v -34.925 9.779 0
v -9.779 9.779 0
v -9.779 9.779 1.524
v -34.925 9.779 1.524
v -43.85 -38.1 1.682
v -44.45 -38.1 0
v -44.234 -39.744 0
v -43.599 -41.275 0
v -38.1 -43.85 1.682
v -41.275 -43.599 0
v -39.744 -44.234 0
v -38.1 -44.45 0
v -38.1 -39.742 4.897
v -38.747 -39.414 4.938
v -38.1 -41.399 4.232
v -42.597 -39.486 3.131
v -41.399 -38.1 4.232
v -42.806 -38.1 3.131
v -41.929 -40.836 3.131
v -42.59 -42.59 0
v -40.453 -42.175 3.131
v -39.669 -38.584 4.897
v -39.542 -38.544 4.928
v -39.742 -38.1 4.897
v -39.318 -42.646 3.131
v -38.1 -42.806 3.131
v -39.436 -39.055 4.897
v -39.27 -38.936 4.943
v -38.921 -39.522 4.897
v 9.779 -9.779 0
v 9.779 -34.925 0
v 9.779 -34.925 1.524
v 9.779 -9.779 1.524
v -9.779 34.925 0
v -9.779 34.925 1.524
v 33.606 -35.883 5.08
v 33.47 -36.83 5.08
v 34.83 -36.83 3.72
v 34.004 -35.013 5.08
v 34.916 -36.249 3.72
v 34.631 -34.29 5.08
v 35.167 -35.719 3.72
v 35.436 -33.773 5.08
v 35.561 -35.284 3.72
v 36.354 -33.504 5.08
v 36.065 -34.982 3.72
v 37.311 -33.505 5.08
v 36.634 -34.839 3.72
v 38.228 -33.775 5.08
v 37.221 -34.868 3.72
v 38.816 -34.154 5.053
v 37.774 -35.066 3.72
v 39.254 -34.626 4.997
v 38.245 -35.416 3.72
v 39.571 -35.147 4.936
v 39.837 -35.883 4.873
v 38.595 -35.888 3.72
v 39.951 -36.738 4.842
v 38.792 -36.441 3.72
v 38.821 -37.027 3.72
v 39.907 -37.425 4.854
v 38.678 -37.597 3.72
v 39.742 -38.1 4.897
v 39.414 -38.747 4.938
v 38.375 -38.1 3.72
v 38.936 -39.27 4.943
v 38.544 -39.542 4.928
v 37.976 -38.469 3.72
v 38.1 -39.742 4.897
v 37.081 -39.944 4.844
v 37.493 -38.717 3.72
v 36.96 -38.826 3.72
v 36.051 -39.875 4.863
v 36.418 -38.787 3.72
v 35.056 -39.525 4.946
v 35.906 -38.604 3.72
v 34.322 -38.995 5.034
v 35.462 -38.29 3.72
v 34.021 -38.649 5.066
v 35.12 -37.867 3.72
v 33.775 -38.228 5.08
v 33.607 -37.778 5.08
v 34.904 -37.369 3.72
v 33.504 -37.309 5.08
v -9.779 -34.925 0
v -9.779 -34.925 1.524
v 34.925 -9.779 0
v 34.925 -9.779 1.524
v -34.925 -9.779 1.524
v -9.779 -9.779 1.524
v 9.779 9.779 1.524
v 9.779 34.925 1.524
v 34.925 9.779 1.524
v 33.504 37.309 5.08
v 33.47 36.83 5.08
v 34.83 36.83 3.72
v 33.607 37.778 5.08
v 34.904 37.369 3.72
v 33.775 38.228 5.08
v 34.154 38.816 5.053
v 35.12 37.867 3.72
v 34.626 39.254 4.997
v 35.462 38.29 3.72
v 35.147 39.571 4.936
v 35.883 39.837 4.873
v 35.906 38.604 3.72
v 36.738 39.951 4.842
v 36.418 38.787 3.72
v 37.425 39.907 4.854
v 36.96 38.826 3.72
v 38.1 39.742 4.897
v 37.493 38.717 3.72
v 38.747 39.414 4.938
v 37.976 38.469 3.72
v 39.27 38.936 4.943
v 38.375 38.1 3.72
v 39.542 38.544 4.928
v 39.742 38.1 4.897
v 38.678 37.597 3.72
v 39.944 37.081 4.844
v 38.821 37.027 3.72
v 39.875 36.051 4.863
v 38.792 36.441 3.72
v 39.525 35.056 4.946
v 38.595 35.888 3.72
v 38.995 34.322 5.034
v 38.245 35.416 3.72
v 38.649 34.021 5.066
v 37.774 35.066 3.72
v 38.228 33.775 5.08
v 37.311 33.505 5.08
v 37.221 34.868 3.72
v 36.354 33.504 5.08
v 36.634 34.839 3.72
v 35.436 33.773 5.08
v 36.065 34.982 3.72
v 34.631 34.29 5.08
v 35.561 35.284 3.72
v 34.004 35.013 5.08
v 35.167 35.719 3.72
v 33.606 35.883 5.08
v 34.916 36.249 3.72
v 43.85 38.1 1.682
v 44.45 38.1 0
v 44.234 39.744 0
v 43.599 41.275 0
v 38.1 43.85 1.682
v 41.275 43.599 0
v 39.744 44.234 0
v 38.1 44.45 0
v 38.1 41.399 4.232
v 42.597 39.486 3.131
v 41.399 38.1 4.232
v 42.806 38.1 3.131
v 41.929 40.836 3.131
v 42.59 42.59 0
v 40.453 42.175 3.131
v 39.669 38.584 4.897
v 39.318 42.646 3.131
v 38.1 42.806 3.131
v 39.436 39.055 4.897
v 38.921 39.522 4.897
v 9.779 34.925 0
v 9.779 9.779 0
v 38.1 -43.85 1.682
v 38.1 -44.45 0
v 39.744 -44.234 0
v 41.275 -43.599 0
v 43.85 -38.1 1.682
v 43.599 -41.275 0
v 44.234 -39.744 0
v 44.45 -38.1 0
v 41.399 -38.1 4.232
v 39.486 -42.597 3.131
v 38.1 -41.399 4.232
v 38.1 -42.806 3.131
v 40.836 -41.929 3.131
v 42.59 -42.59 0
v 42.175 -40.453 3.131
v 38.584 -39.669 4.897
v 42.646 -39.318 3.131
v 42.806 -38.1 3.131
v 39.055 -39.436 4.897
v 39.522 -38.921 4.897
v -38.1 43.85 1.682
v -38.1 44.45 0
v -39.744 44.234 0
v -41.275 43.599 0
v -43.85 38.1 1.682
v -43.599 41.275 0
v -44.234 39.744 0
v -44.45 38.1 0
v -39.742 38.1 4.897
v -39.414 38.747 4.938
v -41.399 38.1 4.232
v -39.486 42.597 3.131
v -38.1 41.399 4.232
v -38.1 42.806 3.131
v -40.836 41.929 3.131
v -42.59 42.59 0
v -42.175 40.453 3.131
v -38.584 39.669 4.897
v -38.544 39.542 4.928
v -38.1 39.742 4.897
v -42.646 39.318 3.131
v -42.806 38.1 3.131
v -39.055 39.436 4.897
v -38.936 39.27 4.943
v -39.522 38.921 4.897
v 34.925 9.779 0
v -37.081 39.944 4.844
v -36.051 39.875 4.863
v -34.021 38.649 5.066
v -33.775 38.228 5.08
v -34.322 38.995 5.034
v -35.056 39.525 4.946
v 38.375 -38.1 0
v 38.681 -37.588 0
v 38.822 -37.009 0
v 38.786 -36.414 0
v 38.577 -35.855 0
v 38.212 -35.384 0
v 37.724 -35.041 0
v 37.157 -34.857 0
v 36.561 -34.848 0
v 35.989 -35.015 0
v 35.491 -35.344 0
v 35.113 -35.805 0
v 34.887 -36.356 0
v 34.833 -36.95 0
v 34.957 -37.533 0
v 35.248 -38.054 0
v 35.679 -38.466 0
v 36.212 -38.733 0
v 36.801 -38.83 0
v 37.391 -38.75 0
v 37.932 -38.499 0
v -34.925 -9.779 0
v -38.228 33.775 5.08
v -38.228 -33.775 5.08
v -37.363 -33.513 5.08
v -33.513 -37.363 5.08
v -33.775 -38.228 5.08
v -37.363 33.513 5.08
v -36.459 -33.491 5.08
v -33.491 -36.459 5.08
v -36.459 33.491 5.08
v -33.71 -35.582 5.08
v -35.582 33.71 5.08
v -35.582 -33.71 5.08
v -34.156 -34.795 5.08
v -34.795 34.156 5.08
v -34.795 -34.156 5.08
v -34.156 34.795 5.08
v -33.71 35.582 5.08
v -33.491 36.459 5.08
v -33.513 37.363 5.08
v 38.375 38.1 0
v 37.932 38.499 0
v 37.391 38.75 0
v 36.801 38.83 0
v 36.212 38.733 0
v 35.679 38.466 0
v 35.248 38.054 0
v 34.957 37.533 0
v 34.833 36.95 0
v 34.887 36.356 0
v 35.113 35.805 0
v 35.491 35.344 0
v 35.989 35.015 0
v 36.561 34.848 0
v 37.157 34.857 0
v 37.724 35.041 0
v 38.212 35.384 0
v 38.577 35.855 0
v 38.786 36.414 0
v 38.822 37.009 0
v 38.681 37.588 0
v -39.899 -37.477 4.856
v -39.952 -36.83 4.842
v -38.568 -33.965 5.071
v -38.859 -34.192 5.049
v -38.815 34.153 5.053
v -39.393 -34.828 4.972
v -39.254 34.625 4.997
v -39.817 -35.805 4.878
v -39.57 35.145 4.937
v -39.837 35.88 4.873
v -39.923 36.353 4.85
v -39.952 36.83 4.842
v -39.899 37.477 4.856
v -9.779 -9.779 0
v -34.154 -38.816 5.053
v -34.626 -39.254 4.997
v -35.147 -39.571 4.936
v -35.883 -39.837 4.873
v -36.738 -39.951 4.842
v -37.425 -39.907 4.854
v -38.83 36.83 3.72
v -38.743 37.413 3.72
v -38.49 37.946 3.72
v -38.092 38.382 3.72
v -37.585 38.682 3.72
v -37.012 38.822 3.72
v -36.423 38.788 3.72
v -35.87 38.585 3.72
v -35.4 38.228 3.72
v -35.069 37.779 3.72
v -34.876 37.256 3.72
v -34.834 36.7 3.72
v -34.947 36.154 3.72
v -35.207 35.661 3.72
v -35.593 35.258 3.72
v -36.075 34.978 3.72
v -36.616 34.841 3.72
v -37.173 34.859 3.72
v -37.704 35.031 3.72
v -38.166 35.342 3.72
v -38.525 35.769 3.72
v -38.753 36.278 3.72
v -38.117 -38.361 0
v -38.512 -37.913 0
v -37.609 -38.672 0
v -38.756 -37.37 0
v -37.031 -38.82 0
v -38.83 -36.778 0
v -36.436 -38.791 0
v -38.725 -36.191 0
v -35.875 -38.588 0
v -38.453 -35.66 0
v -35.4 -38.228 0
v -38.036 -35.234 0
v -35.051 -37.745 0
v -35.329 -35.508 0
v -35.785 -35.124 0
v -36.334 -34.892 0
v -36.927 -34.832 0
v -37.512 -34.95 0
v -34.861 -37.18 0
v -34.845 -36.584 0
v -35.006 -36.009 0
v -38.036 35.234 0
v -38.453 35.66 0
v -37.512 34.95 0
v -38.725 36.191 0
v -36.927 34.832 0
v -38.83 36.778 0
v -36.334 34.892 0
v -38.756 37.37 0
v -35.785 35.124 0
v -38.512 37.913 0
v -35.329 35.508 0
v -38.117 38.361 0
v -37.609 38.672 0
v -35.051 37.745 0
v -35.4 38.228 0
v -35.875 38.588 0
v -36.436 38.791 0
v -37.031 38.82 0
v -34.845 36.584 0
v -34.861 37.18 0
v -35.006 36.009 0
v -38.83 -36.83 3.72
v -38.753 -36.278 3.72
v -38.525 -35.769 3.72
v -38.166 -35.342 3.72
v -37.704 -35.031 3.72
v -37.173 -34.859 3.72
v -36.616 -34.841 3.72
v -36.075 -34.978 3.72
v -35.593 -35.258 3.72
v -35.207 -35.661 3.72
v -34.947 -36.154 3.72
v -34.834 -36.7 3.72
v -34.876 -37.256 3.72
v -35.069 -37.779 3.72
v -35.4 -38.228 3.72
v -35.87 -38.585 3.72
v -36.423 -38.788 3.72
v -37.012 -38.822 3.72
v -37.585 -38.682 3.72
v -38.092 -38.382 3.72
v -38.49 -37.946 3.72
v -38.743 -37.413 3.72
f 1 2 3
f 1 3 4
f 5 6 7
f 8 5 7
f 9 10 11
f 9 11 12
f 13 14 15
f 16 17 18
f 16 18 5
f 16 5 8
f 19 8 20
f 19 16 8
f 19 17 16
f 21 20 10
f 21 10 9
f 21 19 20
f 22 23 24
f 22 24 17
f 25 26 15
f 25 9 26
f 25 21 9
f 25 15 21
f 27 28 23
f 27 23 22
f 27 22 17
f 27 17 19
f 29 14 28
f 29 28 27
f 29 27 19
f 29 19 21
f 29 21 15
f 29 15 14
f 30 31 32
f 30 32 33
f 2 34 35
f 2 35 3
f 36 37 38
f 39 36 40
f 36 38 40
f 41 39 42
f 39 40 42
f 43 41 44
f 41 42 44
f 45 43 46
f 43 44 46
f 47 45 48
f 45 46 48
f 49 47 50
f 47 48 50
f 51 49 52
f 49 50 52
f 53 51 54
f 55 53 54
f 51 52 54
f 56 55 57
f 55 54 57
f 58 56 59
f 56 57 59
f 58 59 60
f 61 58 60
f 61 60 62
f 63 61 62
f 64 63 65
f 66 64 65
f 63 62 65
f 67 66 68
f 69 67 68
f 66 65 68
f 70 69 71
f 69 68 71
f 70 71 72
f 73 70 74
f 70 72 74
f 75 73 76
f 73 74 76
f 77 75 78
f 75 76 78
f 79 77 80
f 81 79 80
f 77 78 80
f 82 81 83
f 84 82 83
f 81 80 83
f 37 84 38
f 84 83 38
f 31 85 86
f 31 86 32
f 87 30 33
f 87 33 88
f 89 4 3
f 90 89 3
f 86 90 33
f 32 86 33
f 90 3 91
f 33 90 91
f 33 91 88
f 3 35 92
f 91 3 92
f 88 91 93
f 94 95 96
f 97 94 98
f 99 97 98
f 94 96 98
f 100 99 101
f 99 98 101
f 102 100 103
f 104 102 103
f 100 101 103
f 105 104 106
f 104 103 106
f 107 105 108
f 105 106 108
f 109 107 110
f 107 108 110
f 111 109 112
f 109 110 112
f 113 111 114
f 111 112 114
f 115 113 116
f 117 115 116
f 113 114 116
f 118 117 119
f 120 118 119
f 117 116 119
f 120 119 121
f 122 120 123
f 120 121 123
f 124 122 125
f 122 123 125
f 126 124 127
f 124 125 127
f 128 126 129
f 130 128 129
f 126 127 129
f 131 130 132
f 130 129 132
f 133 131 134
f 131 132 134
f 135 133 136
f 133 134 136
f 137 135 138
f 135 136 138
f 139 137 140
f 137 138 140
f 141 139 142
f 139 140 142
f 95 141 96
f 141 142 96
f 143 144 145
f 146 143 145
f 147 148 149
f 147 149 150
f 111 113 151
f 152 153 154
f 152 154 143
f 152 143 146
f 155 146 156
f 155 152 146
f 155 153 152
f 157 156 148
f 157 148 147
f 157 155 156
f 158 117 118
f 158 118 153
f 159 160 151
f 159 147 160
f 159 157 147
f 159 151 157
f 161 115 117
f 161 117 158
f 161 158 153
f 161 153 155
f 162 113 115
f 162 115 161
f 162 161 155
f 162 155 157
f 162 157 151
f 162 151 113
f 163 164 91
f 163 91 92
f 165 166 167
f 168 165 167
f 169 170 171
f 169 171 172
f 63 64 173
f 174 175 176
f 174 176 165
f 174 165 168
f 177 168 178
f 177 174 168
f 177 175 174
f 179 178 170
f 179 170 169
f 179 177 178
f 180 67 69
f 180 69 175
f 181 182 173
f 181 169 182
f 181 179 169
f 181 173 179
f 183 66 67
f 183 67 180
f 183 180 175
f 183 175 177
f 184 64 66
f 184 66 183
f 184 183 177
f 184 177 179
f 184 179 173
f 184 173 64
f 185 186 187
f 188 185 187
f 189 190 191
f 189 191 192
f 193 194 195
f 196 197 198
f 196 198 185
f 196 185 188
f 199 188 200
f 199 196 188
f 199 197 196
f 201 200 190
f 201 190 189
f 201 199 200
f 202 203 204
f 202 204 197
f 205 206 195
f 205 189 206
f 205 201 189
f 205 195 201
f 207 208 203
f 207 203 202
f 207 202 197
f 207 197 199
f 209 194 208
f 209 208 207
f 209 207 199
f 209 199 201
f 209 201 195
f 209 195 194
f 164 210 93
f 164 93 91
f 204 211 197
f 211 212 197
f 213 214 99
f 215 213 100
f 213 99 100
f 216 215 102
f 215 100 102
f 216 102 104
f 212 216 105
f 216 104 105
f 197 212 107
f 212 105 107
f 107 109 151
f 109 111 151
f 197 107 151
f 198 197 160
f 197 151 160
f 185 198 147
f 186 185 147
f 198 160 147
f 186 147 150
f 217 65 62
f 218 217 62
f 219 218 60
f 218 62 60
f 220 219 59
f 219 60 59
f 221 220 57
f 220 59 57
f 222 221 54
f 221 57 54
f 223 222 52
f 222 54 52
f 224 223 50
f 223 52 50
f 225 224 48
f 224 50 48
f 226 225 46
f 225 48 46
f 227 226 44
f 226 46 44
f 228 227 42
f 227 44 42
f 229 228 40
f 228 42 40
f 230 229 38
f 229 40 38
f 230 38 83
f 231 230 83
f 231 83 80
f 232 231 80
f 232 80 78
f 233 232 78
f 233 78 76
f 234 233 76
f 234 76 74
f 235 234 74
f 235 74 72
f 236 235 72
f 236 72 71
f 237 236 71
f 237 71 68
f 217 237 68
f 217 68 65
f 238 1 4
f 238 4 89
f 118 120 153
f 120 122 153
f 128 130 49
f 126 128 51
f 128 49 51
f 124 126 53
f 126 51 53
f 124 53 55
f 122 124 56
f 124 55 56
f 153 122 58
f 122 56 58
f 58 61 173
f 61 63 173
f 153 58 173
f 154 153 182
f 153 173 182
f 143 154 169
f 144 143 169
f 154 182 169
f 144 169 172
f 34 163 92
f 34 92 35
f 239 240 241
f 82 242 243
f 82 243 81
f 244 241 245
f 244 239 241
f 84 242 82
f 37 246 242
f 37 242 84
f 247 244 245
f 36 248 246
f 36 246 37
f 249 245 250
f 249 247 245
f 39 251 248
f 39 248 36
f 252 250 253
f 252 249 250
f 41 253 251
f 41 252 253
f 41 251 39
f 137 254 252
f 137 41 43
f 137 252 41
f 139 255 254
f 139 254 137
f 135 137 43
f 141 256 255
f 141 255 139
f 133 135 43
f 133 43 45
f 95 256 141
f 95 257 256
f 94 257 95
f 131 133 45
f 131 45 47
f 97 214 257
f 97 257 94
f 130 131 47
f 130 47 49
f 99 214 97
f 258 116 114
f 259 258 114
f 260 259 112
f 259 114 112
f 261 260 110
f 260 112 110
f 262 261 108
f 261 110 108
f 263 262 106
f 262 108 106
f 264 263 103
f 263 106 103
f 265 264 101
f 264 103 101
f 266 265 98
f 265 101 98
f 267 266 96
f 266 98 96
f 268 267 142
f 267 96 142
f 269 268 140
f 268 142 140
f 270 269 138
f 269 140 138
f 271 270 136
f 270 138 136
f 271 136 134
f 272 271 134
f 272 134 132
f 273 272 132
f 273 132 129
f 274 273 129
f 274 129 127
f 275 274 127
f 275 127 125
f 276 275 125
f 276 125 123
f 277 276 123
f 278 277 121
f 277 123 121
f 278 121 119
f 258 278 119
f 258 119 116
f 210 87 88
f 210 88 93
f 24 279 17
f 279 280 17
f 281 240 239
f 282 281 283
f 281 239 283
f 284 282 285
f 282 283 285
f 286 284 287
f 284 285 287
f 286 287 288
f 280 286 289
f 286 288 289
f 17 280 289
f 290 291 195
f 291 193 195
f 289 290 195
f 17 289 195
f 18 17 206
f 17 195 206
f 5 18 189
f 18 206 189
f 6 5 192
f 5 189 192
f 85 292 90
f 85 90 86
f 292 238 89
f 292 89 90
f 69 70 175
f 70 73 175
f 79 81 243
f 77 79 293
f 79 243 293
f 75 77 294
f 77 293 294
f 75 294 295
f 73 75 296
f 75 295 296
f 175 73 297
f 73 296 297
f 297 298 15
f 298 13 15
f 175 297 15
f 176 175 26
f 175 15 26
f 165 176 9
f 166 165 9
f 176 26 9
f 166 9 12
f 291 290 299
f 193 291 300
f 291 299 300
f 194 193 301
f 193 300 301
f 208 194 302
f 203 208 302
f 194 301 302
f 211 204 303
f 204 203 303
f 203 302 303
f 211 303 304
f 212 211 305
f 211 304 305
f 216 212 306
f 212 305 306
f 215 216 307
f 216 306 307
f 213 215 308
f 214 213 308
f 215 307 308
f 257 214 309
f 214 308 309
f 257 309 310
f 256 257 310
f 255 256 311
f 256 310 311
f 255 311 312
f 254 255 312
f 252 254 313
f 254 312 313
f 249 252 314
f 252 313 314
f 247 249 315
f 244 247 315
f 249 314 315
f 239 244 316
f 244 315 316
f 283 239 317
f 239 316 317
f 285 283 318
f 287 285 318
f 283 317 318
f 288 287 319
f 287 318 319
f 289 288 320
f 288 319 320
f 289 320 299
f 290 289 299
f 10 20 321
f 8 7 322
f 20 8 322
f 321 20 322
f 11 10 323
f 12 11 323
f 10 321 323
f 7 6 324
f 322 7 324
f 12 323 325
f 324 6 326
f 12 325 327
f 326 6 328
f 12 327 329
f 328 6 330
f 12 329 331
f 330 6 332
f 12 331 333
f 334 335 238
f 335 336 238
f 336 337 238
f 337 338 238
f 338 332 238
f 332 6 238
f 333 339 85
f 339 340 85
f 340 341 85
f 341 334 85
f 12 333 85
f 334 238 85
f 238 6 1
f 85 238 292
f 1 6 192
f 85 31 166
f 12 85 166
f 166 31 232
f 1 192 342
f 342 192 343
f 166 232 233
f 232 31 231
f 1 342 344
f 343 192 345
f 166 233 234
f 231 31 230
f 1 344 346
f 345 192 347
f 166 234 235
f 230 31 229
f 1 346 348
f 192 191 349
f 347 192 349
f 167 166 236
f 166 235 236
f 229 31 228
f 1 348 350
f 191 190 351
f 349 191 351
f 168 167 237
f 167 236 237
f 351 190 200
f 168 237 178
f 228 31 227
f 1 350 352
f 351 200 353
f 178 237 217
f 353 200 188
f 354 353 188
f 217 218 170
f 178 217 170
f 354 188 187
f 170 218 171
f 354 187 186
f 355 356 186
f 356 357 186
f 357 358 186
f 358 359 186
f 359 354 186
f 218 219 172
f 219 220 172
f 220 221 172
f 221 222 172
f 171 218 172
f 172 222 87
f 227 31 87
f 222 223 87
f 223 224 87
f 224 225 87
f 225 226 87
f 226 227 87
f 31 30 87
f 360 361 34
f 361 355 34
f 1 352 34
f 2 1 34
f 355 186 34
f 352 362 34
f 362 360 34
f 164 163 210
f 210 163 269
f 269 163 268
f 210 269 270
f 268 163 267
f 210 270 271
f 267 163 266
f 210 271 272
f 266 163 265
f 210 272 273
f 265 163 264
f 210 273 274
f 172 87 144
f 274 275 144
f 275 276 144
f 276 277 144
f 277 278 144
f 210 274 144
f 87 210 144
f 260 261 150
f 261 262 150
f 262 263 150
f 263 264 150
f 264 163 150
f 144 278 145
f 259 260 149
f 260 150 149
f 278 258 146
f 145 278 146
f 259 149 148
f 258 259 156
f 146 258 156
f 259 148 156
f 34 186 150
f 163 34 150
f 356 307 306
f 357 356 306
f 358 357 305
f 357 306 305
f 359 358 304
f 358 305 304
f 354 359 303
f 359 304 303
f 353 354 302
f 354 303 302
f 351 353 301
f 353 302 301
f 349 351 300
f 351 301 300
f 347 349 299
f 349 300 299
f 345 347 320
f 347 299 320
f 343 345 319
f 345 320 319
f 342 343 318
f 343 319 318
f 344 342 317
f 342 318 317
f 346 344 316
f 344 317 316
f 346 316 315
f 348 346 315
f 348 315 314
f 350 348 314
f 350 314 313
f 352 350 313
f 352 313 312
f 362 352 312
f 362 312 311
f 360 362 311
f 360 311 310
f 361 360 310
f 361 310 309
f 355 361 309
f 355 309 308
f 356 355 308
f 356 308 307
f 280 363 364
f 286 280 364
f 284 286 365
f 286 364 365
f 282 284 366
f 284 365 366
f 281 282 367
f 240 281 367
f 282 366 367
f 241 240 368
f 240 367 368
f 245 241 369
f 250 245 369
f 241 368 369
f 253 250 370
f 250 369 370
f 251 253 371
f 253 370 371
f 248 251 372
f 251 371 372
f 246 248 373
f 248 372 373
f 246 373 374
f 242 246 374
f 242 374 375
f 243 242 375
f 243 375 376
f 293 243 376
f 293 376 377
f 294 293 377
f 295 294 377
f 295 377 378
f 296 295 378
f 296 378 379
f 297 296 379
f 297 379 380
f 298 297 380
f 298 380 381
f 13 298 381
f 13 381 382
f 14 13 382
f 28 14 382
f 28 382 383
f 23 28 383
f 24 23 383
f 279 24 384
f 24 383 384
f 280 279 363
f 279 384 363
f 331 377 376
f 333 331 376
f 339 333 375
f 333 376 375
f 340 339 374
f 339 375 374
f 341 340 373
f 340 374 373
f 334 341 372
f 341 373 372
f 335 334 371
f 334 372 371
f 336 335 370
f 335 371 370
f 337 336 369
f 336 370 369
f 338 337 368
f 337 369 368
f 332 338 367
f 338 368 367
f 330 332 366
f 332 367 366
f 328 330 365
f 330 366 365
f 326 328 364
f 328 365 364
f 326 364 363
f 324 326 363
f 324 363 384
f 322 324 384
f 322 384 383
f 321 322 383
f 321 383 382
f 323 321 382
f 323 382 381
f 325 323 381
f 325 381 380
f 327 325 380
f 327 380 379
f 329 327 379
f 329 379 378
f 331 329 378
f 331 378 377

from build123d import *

# Parameters (mm, degrees)
BOSS_EXTRUDE1_DEPTH                                  = 5.08
FILLET1_R                                            = 6.35
SKETCH2_R                                            = 2.00025
CUT_EXTRUDE1_DEPTH                                   = 5.08
CUT_EXTRUDE2_DEPTH                                   = 1.524
CSK_FOR_M3_HEX_SOCKET_COUNTERSUNK_CAP_SC_D           = 3.4
CSK_FOR_M3_HEX_SOCKET_COUNTERSUNK_CAP_SC_CSINK_D     = 6.72
CSK_FOR_M3_HEX_SOCKET_COUNTERSUNK_CAP_SC_CSINK_ANGLE = 90


with BuildPart() as part:
    # Sketch1 → Boss-Extrude1 (new body)
    with BuildSketch(Plane.XY):
        with BuildLine():
            Line((-38.1, -44.45), (38.1, -44.45))
            ThreePointArc((38.1, -44.45), (42.590128061, -42.590128061), (44.45, -38.1))
            Line((44.45, -38.1), (44.45, 38.1))
            ThreePointArc((44.45, 38.1), (42.590128061, 42.590128061), (38.1, 44.45))
            Line((38.1, 44.45), (-38.1, 44.45))
            ThreePointArc((-38.1, 44.45), (-42.590128061, 42.590128061), (-44.45, 38.1))
            Line((-44.45, 38.1), (-44.45, -38.1))
            ThreePointArc((-44.45, -38.1), (-42.590128061, -42.590128061), (-38.1, -44.45))
        make_face()
    extrude(amount=BOSS_EXTRUDE1_DEPTH)

    # Fillet1
    # the kernel refuses this fillet: 6.35 mm, written as the material it takes off along each edge
    with BuildSketch(Plane(origin=(38.1, 44.45, 5.08), x_dir=(0, -1.563753501140824e-12, -1.0), z_dir=(-1, 0, 0)), Plane(origin=(44.45, -38.1, 5.08), x_dir=(-1.563753501140824e-12, 0, -1.0), z_dir=(0, 1, 0)), Plane(origin=(-38.1, -44.45, 5.08), x_dir=(0, 1.563753501140824e-12, -1.0), z_dir=(1, 0, 0)), Plane(origin=(-44.45, 38.1, 5.08), x_dir=(1.563753501140824e-12, 0, -1.0), z_dir=(0, -1, 0))) as fillet1_piece_1:
        with BuildLine():
            CenterArc((6.35, 6.221703947), FILLET1_R, 180, 78.463040967)
            Line((0, 6.221703947), (-0.127, 6.221703947))
            Line((-0.127, 6.221703947), (-0.127, 0))
            Line((-0.127, 0), (0, -0.127))
            ThreePointArc((0, -0.127), (2.54, -0.127), (5.0546, -0.124434079))
            Line((5.0546, -0.124434079), (5.08, 0))
        make_face()
    extrude(amount=76.2, mode=Mode.SUBTRACT)
    with BuildSketch(Plane(origin=(38.1, 38.1, 5.08), x_dir=(1, 0, 0), z_dir=(0, -1, 0))) as fillet1_piece_2:
        with BuildLine():
            CenterArc((0.128296053, -6.35), FILLET1_R, 11.536959033, 78.463040967)
            Line((0.128296053, 0), (0.128296053, 0.127))
            Line((0.128296053, 0.127), (6.35, 0.127))
            Line((6.35, 0.127), (6.477, 0))
            ThreePointArc((6.477, 0), (6.477, -2.54), (6.474434079, -5.0546))
            Line((6.474434079, -5.0546), (6.35, -5.08))
        make_face()
    revolve(axis=Axis((38.1, 38.1, 5.08), (0, 0, 1)), revolution_arc=90, mode=Mode.SUBTRACT)
    with BuildSketch(Plane(origin=(38.1, -38.1, 5.08), x_dir=(0, -1, 0), z_dir=(-1, 0, 0))) as fillet1_piece_3:
        with BuildLine():
            CenterArc((0.128296053, -6.35), FILLET1_R, 11.536959033, 78.463040967)
            Line((0.128296053, 0), (0.128296053, 0.127))
            Line((0.128296053, 0.127), (6.35, 0.127))
            Line((6.35, 0.127), (6.477, 0))
            ThreePointArc((6.477, 0), (6.477, -2.54), (6.474434079, -5.0546))
            Line((6.474434079, -5.0546), (6.35, -5.08))
        make_face()
    revolve(axis=Axis((38.1, -38.1, 5.08), (0, 0, 1)), revolution_arc=90, mode=Mode.SUBTRACT)
    with BuildSketch(Plane(origin=(-38.1, -38.1, 5.08), x_dir=(-1, 0, 0), z_dir=(0, 1, 0))) as fillet1_piece_4:
        with BuildLine():
            CenterArc((0.128296053, -6.35), FILLET1_R, 11.536959033, 78.463040967)
            Line((0.128296053, 0), (0.128296053, 0.127))
            Line((0.128296053, 0.127), (6.35, 0.127))
            Line((6.35, 0.127), (6.477, 0))
            ThreePointArc((6.477, 0), (6.477, -2.54), (6.474434079, -5.0546))
            Line((6.474434079, -5.0546), (6.35, -5.08))
        make_face()
    revolve(axis=Axis((-38.1, -38.1, 5.08), (0, 0, 1)), revolution_arc=90, mode=Mode.SUBTRACT)
    with BuildSketch(Plane(origin=(-38.1, 38.1, 5.08), x_dir=(0, 1, 0), z_dir=(1, 0, 0))) as fillet1_piece_5:
        with BuildLine():
            CenterArc((0.128296053, -6.35), FILLET1_R, 11.536959033, 78.463040967)
            Line((0.128296053, 0), (0.128296053, 0.127))
            Line((0.128296053, 0.127), (6.35, 0.127))
            Line((6.35, 0.127), (6.477, 0))
            ThreePointArc((6.477, 0), (6.477, -2.54), (6.474434079, -5.0546))
            Line((6.474434079, -5.0546), (6.35, -5.08))
        make_face()
    revolve(axis=Axis((-38.1, 38.1, 5.08), (0, 0, 1)), revolution_arc=90, mode=Mode.SUBTRACT)

    # Sketch2 → Cut-Extrude1 (cut)
    with BuildSketch(Plane.XY.offset(5.08)):
        with Locations(Location((-36.83, 36.83, 0), (0, 0, 44.351687845))):
            Circle(SKETCH2_R)
        with Locations(Location((36.83, 36.83, 0), (0, 0, 39.414098339))):
            Circle(SKETCH2_R)
        with Locations(Location((36.83, -36.83, 0), (0, 0, 320.585901644))):
            Circle(SKETCH2_R)
        with Locations(Location((-36.83, -36.83, 0), (0, 0, 315.648312155))):
            Circle(SKETCH2_R)
    extrude(amount=-CUT_EXTRUDE1_DEPTH, mode=Mode.SUBTRACT)

    # Sketch4 → Cut-Extrude2 (cut)
    with BuildSketch(Plane(origin=(0, 0, 0), x_dir=(-1, 0, 0), z_dir=(0, 0, -1))):
        Polygon((-9.779, 9.779), (-9.779, 34.925), (9.779, 34.925), (9.779, 9.779), (34.925, 9.779), (34.925, -9.779), (9.779, -9.779), (9.779, -34.925), (-9.779, -34.925), (-9.779, -9.779), (-34.925, -9.779), (-34.925, 9.779), align=None)
    extrude(amount=-CUT_EXTRUDE2_DEPTH, mode=Mode.SUBTRACT)

    # CSK for M3 Hex Socket Countersunk Cap Screw1 (through all)
    with Locations(Plane.XY.offset(5.08)):
        with Locations((-36.83, 36.83), (36.83, 36.83), (36.83, -36.83), (-36.83, -36.83)):
            CounterSinkHole(CSK_FOR_M3_HEX_SOCKET_COUNTERSUNK_CAP_SC_D / 2, CSK_FOR_M3_HEX_SOCKET_COUNTERSUNK_CAP_SC_CSINK_D / 2, counter_sink_angle=CSK_FOR_M3_HEX_SOCKET_COUNTERSUNK_CAP_SC_CSINK_ANGLE)


solid = part.part
